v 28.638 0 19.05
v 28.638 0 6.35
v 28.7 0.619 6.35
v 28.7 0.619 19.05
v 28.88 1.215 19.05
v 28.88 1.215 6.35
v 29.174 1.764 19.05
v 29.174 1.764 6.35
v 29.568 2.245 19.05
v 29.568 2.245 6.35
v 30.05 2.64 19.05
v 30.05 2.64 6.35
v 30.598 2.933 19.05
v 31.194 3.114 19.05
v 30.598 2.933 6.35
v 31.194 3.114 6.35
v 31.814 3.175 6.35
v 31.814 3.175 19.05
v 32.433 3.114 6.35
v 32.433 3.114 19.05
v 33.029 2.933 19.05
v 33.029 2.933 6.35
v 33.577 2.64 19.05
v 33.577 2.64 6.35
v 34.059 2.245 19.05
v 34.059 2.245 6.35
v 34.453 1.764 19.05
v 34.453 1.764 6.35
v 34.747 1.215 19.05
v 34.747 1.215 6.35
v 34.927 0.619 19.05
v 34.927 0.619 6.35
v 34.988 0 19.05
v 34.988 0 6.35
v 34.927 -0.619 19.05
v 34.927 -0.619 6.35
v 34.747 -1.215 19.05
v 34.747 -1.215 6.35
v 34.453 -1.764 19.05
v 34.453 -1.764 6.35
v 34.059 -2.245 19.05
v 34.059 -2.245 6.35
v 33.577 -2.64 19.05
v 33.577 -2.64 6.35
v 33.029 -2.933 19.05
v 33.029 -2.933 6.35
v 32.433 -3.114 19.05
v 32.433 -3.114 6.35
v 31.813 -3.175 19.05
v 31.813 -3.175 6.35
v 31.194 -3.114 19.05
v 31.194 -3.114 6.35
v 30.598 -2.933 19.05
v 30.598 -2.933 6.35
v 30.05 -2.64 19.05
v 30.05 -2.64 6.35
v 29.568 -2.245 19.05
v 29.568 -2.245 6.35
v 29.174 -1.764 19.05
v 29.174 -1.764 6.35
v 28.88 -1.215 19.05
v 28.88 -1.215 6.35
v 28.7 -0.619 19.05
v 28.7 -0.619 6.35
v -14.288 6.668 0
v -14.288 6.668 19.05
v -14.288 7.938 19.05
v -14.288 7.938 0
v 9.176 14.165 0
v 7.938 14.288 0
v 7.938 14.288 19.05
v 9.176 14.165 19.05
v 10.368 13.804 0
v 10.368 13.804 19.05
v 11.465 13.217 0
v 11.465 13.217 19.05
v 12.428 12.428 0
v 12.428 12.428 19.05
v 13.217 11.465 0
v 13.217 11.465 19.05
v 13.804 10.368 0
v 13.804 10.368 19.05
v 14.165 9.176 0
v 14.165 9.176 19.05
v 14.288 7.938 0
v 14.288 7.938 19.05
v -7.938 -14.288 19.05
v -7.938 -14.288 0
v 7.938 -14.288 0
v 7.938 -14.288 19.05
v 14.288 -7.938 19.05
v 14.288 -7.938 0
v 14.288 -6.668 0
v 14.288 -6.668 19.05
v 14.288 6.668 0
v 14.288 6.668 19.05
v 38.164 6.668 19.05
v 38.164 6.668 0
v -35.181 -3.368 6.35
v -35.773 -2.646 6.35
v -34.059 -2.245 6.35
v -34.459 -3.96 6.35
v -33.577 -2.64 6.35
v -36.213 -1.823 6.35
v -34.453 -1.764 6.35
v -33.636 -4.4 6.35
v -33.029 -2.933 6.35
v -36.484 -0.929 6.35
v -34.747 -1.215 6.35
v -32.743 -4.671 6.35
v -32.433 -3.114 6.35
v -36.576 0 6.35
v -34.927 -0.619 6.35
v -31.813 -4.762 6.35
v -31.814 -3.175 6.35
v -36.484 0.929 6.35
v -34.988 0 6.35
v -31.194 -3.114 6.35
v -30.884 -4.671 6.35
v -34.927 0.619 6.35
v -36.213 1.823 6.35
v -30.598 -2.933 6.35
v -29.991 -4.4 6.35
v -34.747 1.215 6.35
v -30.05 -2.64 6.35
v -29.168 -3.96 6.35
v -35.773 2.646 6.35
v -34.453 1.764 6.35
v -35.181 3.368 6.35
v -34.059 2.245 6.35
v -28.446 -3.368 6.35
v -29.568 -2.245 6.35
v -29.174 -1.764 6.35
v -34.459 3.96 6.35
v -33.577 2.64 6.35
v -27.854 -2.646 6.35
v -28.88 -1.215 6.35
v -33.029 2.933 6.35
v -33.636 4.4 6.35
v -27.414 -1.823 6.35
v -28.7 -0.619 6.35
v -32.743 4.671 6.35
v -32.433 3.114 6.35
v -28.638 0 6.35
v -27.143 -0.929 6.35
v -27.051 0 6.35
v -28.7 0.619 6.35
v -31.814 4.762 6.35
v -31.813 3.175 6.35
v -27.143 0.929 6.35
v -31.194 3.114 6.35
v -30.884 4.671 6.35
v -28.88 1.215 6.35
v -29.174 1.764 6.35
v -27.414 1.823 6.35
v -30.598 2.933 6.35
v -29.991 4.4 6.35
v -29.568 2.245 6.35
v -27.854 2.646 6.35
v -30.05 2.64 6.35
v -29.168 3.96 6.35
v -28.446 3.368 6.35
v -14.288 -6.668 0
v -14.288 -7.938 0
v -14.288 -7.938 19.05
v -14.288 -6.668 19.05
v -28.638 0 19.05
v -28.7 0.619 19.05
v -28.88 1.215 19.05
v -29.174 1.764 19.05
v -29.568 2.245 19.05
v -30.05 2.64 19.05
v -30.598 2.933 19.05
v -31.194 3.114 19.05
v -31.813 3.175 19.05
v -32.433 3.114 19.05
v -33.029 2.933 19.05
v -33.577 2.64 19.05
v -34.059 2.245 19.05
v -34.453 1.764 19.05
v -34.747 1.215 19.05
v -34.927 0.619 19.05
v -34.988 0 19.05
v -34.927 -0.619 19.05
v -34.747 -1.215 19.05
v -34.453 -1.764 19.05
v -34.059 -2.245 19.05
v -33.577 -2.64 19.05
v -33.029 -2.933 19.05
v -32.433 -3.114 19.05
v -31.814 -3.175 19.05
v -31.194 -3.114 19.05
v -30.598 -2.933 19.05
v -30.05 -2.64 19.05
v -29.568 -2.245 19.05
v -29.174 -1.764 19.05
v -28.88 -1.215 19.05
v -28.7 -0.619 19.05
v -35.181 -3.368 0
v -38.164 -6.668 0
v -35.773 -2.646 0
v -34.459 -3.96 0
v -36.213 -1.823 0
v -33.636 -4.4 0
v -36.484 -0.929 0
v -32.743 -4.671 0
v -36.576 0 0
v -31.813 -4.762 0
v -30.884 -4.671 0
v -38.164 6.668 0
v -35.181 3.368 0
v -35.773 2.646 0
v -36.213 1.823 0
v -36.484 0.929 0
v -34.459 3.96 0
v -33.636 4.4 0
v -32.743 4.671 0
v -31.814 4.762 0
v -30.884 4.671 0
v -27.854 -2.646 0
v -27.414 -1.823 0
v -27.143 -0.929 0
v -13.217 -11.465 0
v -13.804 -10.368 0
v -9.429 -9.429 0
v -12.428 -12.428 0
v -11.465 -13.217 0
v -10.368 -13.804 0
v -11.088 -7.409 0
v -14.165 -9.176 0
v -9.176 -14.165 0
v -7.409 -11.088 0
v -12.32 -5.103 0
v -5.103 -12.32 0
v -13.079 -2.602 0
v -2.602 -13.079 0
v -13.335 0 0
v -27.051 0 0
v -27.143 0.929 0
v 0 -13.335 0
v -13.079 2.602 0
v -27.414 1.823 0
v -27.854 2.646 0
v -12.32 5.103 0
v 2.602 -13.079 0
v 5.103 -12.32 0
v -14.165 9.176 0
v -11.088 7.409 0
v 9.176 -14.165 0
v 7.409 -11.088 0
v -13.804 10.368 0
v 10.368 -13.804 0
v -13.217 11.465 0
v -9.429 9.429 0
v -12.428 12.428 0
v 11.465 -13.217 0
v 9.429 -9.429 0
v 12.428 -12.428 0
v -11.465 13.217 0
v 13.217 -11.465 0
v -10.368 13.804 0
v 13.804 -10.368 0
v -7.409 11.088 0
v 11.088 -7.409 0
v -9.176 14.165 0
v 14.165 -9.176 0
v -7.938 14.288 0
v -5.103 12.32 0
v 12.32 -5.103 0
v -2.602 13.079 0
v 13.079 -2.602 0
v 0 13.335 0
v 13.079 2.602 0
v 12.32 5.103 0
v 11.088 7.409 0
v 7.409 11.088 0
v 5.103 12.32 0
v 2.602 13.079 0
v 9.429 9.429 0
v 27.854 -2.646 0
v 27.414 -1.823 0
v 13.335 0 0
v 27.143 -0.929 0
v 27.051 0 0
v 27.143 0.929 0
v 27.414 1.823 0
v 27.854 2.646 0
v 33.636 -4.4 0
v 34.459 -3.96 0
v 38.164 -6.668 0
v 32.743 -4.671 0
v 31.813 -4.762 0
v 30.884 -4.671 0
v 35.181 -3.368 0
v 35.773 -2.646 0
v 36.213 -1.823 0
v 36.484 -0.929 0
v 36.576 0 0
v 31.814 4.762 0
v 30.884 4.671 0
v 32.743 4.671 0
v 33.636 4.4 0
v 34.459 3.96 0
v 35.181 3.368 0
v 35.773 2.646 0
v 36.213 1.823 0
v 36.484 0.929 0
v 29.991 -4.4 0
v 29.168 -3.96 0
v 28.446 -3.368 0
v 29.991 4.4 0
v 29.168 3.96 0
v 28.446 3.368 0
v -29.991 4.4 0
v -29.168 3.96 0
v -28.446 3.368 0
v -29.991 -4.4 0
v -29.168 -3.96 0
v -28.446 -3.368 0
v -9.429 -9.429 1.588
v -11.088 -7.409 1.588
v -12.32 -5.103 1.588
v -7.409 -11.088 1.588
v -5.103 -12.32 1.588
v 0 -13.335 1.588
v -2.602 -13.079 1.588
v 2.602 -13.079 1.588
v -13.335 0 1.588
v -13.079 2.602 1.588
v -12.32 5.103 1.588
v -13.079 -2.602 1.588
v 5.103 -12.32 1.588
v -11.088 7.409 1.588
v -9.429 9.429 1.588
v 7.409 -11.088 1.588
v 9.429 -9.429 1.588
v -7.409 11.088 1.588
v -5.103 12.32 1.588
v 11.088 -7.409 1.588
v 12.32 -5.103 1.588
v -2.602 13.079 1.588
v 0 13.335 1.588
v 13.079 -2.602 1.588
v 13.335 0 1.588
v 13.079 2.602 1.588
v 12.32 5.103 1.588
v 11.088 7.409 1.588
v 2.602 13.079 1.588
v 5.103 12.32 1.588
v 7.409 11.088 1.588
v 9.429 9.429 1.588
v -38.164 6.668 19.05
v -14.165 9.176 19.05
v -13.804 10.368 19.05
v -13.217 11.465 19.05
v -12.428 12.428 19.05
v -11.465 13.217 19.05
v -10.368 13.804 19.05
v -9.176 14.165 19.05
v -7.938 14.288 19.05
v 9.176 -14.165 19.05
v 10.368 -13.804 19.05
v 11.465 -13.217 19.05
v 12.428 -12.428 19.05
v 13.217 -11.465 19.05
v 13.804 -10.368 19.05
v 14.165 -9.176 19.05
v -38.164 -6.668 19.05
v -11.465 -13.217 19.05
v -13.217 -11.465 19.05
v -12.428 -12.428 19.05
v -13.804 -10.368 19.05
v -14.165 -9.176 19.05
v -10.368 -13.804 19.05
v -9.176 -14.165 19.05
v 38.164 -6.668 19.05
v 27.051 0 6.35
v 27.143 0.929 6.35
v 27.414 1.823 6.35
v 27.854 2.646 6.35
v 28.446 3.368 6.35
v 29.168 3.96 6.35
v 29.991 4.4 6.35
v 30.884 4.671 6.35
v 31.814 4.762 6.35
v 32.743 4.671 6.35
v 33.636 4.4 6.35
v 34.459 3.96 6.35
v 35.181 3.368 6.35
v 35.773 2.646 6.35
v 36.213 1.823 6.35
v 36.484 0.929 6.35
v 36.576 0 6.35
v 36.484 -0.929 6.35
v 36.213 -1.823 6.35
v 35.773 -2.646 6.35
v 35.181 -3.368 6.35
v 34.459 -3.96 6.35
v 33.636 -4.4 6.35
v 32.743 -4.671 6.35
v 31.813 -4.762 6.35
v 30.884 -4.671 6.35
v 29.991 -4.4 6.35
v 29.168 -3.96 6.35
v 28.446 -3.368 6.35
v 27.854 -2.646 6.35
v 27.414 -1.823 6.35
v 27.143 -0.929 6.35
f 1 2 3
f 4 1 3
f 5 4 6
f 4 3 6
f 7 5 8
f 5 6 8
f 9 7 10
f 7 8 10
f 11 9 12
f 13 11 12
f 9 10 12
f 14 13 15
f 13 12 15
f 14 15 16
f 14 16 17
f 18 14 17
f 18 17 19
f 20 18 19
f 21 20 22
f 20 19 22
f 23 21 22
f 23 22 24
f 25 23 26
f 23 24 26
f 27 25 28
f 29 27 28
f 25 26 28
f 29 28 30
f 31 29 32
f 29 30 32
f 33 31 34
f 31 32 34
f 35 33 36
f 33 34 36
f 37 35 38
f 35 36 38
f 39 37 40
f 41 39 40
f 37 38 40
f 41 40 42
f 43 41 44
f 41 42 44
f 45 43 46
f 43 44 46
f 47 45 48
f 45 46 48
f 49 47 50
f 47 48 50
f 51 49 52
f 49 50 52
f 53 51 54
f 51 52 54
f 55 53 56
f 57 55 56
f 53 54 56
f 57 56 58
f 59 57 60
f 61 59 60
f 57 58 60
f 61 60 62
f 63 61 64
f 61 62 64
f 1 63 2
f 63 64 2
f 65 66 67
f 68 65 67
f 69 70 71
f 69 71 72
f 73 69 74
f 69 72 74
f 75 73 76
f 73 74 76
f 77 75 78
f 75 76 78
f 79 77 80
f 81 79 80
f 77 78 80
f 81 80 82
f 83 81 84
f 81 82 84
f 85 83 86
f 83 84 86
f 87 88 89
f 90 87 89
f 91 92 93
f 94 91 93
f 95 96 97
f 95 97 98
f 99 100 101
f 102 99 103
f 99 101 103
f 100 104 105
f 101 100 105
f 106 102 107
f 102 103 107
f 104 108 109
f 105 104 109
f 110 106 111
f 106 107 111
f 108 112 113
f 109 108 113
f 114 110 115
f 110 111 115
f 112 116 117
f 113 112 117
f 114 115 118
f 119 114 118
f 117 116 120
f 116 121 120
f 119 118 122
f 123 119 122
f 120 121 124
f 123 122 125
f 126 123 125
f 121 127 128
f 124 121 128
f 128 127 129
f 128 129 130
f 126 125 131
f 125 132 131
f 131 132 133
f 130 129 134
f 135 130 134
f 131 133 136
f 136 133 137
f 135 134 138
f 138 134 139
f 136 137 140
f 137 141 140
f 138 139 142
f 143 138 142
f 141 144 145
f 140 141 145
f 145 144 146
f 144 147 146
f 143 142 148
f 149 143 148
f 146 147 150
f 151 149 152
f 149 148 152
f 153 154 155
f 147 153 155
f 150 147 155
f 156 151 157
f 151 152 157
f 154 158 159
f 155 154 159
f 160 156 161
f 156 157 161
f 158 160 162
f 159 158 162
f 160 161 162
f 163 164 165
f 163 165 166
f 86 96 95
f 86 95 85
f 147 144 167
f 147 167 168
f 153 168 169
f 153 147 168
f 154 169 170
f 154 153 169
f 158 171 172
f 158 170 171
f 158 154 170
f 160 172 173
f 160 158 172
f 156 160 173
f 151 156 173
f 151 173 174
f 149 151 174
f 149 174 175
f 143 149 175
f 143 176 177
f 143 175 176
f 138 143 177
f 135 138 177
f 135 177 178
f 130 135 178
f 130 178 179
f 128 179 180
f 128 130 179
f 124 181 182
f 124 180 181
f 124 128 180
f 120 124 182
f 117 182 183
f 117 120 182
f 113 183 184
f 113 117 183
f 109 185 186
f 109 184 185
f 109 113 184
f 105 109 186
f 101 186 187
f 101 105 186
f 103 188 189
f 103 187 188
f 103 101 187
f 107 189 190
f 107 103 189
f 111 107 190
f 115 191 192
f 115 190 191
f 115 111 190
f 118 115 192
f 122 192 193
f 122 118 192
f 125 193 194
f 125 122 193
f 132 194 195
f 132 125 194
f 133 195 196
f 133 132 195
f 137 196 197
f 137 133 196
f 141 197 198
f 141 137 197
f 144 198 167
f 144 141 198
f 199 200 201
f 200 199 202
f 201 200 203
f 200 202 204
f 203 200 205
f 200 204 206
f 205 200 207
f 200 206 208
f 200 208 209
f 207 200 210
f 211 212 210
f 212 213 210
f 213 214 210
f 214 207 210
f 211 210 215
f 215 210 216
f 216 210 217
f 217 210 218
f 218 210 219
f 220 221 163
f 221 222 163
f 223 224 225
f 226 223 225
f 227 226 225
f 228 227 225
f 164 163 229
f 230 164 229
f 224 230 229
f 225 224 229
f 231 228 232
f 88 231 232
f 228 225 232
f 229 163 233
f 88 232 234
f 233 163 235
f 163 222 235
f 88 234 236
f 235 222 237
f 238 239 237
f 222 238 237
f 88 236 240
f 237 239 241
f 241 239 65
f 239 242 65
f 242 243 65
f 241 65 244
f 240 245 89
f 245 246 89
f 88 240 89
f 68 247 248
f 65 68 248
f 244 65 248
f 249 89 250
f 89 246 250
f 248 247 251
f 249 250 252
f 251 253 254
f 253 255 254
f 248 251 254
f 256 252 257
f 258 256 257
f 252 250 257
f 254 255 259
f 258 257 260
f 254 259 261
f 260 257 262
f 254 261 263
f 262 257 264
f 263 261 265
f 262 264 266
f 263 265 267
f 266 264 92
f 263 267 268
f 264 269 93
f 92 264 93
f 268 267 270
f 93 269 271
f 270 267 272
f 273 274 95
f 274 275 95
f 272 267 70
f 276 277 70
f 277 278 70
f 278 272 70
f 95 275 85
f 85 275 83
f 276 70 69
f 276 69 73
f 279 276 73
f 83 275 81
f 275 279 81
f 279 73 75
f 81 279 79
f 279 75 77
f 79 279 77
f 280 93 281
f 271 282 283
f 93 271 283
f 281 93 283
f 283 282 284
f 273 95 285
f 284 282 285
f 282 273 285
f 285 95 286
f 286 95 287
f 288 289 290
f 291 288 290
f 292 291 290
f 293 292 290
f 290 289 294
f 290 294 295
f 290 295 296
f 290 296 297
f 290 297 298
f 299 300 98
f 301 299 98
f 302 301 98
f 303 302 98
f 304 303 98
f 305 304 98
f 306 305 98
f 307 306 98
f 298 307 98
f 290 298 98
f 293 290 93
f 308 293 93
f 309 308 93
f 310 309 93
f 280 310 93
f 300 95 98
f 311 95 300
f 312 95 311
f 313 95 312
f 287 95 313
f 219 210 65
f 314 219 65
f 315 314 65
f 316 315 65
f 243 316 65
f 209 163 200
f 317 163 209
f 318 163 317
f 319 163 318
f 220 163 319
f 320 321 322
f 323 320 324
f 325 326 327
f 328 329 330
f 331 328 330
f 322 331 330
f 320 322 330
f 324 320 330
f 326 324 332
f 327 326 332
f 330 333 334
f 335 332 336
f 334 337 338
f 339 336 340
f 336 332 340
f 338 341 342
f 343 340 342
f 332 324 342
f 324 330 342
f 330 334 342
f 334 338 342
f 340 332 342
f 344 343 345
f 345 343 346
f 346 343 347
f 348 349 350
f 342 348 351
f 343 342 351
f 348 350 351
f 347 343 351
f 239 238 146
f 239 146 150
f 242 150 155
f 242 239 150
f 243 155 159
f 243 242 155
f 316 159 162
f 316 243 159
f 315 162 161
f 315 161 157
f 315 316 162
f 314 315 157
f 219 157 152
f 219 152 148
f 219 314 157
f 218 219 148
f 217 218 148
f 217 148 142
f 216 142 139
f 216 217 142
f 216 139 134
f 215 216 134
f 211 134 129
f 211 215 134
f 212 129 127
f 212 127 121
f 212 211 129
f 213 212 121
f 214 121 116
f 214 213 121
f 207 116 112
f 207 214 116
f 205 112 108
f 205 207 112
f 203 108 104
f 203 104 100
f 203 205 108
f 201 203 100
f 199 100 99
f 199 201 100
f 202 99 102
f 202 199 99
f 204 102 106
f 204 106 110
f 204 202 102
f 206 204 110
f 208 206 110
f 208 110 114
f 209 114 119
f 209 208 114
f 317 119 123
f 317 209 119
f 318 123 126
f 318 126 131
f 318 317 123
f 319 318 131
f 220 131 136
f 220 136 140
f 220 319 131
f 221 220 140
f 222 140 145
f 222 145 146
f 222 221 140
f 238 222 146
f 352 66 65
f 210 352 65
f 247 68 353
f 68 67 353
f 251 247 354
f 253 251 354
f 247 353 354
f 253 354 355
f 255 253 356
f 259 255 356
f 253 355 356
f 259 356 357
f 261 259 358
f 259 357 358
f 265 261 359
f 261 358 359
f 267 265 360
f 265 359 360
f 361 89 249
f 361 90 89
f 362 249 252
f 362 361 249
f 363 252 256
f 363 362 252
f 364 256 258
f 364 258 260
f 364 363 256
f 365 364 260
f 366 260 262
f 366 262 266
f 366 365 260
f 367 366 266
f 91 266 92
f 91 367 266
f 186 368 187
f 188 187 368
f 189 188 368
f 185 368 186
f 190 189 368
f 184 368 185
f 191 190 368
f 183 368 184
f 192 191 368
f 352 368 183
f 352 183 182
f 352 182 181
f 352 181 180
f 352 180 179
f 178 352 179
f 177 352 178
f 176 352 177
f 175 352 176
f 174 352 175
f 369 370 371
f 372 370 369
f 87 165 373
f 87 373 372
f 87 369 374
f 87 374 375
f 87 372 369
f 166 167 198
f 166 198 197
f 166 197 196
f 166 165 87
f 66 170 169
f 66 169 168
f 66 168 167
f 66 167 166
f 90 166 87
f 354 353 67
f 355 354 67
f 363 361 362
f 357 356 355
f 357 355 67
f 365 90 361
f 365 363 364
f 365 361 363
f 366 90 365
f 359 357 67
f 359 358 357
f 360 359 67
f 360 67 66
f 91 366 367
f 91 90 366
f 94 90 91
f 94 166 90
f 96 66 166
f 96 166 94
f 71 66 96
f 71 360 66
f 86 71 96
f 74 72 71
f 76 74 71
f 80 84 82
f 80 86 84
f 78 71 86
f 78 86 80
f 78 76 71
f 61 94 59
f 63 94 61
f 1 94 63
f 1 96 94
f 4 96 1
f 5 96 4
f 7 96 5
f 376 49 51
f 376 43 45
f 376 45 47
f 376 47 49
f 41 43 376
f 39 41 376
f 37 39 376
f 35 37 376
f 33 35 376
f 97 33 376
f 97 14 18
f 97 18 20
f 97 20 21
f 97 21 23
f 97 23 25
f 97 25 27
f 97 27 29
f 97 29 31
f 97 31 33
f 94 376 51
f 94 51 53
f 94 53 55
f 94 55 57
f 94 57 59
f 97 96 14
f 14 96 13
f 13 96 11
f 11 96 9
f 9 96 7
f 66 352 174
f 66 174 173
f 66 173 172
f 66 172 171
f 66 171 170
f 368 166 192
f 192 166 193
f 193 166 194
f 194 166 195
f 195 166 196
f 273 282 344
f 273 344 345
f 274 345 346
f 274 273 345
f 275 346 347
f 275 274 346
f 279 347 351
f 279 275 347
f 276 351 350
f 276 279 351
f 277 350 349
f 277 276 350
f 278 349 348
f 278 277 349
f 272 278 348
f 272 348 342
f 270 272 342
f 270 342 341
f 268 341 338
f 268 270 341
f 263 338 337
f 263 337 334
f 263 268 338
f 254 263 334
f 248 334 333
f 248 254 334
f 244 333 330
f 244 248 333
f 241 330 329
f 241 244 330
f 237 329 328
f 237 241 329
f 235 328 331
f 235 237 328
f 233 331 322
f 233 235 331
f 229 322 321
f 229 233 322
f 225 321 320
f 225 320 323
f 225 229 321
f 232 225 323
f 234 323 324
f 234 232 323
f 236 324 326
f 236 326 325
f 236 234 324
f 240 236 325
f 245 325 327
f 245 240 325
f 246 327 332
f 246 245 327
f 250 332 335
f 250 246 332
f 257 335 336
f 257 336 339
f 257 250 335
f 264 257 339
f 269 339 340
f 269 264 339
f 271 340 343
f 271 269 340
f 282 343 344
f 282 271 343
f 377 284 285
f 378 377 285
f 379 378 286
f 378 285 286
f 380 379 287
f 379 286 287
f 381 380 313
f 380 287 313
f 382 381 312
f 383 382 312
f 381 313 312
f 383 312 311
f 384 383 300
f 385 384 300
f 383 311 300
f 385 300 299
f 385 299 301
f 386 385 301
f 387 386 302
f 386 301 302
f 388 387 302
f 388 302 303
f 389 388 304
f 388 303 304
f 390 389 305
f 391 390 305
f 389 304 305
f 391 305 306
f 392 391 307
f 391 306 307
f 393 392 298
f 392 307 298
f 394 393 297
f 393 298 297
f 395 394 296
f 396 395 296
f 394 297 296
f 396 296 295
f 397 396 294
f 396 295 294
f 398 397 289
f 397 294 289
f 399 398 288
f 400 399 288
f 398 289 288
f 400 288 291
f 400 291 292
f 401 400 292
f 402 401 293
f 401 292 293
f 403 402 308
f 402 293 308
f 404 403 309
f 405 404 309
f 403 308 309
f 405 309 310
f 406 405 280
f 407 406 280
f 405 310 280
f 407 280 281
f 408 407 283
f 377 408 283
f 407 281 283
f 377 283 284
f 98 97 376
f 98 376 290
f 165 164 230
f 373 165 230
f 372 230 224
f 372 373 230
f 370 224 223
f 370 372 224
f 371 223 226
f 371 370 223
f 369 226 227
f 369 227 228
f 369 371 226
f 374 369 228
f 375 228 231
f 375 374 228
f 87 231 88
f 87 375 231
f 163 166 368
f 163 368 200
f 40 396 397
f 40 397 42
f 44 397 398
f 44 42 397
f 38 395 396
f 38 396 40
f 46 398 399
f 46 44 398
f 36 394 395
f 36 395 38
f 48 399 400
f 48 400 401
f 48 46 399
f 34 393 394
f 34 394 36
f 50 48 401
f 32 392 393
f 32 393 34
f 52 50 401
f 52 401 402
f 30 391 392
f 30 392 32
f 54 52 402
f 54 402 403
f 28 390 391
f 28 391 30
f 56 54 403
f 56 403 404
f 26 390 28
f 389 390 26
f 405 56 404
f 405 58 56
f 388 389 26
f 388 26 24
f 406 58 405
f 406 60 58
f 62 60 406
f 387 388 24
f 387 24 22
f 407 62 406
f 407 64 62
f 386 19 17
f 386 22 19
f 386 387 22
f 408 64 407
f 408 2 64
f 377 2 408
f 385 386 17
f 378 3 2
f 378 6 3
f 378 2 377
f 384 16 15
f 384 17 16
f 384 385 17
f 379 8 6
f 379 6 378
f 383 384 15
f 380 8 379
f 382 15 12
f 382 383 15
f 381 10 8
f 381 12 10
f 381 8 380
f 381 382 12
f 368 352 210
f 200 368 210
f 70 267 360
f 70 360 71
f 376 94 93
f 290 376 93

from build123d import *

# Parameters (mm, degrees)
SKETCH2_W           = 28.575
SKETCH2_H           = 28.575
BOSS_EXTRUDE2_DEPTH = 19.05
SKETCH1_R           = 13.335
CUT_EXTRUDE4_DEPTH  = 1.5875
FILLET2_R           = 6.35
SKETCH3_W           = 19.05
SKETCH3_H           = 13.335
BOSS_EXTRUDE3_DEPTH = 23.876
SKETCH4_R           = 3.175
CUT_EXTRUDE5_DEPTH  = 45.983195623
SKETCH6_R           = 4.7625
CUT_EXTRUDE6_DEPTH  = 6.35


with BuildPart() as part:
    # Sketch2 → Boss-Extrude2 (new body)
    with BuildSketch(Plane.XY):
        Rectangle(SKETCH2_W, SKETCH2_H)
    extrude(amount=BOSS_EXTRUDE2_DEPTH)

    # Sketch1 → Cut-Extrude4 (cut)
    with BuildSketch(Plane.XY):
        Circle(SKETCH1_R)
    extrude(amount=CUT_EXTRUDE4_DEPTH, mode=Mode.SUBTRACT)

    # Fillet2
    fillet2_edges = [part.edges().sort_by_distance(p)[0] for p in [
        (14.2875, -14.2875, 9.525),
        (-14.2875, -14.2875, 9.525),
        (-14.2875, 14.2875, 9.525),
        (14.2875, 14.2875, 9.525),
    ]]
    fillet(fillet2_edges, radius=FILLET2_R)

    # Sketch3 → Boss-Extrude3 (add)
    with BuildSketch(Plane(origin=(14.2875, 0, 0), x_dir=(0, 0, -1), z_dir=(1, 0, 0))):
        with Locations((-9.525, 0)):
            Rectangle(SKETCH3_W, SKETCH3_H)
    boss_extrude3 = extrude(amount=BOSS_EXTRUDE3_DEPTH)

    # Sketch4 → Cut-Extrude5 (cut, symmetric)
    with BuildSketch(Plane(origin=(0, 0, 0), x_dir=(-1, 0, 0), z_dir=(0, 0, -1))):
        with Locations((-31.8135, 0)):
            Circle(SKETCH4_R)
    cut_extrude5 = extrude(amount=CUT_EXTRUDE5_DEPTH, both=True, mode=Mode.SUBTRACT)

    # Sketch6 → Cut-Extrude6 (cut)
    with BuildSketch(Plane(origin=(0, 0, 0), x_dir=(-1, 0, 0), z_dir=(0, 0, -1))):
        with Locations((-31.8135, 0)):
            Circle(SKETCH6_R)
    cut_extrude6 = extrude(amount=-CUT_EXTRUDE6_DEPTH, mode=Mode.SUBTRACT)

    # Mirror1: Boss-Extrude3, Cut-Extrude5, Cut-Extrude6 across plane
    add(boss_extrude3.mirror(Plane(origin=(0, 0, 0), x_dir=(0, 0, 1), z_dir=(1, 0, 0))))
    add(cut_extrude5.mirror(Plane(origin=(0, 0, 0), x_dir=(0, 0, 1), z_dir=(1, 0, 0))), mode=Mode.SUBTRACT)
    add(cut_extrude6.mirror(Plane(origin=(0, 0, 0), x_dir=(0, 0, 1), z_dir=(1, 0, 0))), mode=Mode.SUBTRACT)


solid = part.part
